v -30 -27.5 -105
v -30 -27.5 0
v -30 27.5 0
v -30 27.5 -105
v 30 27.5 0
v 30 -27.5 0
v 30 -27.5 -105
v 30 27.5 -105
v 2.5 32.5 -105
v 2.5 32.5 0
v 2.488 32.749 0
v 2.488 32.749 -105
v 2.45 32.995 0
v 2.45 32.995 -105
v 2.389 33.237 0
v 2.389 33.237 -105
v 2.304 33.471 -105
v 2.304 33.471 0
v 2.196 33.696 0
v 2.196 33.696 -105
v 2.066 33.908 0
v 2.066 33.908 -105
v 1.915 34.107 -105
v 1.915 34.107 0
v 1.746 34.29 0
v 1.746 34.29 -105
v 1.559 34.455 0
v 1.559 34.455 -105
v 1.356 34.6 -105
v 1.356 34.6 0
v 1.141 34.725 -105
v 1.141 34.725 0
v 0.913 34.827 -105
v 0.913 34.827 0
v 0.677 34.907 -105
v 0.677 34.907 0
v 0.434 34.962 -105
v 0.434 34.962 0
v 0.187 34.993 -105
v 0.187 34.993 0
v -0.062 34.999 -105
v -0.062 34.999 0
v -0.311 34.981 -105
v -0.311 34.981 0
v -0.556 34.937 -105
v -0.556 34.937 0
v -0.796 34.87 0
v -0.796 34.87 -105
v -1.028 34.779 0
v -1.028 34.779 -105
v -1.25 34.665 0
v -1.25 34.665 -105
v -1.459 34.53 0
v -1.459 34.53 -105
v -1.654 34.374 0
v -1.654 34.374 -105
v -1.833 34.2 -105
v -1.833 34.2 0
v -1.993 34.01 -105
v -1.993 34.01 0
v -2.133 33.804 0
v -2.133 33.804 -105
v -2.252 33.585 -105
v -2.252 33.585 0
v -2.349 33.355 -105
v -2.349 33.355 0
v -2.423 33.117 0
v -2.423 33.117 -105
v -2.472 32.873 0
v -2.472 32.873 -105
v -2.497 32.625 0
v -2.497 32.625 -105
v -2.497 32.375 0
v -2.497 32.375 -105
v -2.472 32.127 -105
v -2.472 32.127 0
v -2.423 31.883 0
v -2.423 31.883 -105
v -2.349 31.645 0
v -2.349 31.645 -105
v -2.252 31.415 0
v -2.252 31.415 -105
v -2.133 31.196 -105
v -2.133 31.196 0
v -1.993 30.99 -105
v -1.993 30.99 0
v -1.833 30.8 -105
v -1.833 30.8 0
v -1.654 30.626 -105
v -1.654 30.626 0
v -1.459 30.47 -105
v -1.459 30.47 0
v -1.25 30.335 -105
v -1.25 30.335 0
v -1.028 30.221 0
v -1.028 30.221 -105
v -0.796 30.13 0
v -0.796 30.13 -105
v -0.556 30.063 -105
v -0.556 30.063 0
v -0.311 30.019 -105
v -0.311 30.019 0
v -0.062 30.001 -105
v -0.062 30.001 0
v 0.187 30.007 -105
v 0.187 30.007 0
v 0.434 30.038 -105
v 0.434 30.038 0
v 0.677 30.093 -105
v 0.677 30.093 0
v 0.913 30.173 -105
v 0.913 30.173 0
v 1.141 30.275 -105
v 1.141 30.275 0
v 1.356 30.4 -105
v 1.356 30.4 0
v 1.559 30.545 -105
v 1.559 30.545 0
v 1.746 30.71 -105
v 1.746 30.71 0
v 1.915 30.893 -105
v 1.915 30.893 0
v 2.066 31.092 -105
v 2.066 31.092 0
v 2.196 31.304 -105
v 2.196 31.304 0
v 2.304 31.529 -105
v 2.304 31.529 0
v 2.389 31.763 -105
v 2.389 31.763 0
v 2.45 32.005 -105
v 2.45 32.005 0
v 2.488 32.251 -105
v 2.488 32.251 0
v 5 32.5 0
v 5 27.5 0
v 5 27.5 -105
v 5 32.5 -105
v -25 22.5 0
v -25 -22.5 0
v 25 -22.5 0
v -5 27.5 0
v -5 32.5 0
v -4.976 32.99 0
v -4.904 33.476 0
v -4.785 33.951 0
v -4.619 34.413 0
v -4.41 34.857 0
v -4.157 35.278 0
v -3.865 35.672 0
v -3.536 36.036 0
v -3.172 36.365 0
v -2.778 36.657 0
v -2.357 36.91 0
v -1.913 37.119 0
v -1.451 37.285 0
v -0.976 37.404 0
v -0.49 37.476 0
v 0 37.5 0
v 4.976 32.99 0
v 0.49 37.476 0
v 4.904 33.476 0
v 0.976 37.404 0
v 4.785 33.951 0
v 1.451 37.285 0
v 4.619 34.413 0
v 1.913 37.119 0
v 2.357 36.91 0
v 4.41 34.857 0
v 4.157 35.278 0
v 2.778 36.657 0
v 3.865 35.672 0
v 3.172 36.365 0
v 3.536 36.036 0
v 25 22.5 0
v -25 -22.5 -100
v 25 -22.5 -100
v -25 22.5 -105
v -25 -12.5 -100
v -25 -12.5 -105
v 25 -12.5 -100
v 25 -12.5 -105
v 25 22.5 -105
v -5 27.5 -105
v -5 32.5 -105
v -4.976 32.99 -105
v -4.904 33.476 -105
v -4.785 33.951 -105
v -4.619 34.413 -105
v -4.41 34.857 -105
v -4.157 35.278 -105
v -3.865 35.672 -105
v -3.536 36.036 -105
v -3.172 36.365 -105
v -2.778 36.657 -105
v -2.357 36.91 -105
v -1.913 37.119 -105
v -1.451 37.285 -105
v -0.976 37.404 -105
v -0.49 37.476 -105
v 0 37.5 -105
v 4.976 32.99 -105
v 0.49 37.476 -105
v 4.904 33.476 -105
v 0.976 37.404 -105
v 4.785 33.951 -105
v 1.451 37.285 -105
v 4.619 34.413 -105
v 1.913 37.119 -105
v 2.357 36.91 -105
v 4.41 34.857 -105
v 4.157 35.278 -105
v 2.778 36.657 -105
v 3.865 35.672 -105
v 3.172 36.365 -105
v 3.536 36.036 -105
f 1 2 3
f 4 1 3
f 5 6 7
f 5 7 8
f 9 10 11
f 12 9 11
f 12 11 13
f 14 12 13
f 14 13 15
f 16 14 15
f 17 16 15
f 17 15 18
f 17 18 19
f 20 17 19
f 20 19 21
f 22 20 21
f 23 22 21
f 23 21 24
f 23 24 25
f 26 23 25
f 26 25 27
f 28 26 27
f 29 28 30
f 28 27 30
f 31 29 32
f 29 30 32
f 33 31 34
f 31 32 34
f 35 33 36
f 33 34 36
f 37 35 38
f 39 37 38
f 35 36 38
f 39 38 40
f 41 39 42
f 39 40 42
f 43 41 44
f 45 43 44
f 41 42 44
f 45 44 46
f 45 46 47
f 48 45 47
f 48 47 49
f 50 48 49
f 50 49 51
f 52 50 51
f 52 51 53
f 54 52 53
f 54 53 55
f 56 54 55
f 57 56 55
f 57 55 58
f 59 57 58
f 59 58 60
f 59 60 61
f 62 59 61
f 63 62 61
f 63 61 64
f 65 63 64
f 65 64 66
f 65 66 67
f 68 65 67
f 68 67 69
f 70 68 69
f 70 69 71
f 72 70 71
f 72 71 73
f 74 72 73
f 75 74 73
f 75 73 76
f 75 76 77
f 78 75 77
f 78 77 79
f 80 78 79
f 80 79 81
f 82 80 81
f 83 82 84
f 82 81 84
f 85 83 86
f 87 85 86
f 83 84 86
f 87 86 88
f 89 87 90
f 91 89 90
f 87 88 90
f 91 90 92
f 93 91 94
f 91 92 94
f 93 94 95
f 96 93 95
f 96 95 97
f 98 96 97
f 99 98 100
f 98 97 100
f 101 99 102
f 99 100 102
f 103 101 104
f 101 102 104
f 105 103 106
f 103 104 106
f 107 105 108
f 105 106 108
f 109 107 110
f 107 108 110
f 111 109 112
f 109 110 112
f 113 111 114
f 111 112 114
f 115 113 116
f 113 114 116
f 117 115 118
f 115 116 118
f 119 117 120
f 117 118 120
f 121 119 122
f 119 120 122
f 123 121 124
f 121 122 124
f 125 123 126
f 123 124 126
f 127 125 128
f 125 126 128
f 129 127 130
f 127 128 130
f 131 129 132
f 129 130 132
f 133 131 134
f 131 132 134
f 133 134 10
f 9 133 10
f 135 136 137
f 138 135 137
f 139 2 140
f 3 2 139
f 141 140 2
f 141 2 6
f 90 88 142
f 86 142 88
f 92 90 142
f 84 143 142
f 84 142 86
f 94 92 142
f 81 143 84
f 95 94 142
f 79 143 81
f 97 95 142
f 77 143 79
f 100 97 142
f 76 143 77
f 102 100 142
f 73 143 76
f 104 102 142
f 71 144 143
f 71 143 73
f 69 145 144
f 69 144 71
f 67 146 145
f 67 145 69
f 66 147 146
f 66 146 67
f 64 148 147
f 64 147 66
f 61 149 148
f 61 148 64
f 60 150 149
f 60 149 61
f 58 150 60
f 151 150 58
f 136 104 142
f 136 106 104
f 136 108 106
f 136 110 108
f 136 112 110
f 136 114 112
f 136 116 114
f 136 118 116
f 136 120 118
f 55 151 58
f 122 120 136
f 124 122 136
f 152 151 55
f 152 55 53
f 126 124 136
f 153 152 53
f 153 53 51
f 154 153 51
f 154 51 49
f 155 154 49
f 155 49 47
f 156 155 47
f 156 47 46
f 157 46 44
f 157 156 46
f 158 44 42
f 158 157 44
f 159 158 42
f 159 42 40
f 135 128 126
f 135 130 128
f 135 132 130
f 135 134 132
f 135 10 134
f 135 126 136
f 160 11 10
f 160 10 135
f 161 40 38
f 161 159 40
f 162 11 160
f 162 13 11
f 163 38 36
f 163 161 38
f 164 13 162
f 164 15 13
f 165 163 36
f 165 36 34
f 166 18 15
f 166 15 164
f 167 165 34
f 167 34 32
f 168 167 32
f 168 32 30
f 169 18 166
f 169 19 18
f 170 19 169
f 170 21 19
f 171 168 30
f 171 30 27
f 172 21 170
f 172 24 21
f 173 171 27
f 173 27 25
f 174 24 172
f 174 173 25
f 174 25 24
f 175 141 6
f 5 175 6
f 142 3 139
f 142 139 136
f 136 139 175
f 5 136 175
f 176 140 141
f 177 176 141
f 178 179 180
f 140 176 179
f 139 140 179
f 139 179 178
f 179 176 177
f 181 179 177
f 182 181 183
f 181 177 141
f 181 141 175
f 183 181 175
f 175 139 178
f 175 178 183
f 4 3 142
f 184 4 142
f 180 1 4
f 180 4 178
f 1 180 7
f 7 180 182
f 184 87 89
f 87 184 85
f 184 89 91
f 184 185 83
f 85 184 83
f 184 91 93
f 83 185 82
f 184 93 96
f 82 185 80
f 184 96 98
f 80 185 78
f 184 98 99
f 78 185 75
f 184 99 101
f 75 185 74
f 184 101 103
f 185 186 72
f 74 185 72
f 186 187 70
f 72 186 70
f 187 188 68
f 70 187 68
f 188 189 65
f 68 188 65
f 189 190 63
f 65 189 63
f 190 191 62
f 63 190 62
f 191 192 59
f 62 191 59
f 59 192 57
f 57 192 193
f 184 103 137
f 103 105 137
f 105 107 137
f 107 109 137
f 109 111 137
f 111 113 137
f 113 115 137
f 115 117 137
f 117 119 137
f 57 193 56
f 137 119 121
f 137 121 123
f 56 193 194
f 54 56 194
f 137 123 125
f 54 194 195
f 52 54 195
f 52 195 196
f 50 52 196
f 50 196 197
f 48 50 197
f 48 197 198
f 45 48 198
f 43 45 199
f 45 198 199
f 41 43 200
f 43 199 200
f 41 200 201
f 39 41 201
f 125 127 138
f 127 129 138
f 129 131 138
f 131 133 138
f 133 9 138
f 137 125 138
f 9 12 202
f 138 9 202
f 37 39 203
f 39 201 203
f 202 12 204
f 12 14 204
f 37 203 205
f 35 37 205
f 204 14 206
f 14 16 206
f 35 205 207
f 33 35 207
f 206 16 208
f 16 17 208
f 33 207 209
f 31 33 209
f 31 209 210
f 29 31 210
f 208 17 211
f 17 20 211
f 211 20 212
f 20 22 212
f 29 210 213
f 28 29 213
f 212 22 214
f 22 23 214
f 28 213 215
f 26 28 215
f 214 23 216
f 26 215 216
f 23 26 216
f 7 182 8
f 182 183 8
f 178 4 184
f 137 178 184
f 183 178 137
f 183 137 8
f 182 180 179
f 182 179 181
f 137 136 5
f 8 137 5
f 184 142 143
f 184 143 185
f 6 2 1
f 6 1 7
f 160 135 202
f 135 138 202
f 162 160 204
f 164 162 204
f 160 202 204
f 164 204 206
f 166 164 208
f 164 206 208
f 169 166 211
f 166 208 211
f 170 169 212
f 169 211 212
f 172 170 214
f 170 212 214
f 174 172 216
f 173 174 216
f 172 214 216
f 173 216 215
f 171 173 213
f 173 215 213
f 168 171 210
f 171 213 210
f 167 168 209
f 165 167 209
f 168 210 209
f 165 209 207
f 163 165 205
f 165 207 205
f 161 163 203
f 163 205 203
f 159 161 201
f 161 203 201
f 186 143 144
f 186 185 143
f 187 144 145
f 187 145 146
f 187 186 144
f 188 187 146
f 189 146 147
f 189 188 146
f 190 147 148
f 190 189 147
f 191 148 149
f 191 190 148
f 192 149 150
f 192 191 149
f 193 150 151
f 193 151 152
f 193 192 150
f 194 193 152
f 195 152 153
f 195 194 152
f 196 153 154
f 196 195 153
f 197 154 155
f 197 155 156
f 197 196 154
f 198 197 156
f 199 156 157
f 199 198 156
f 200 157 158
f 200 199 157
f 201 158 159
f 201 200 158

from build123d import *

# Parameters (mm, degrees)
SKETCH3_W           = 60
SKETCH3_H           = 55
SKETCH3_W_2         = 50
SKETCH3_H_2         = 45
BOSS_EXTRUDE1_DEPTH = 105
SKETCH6_W           = 50
SKETCH6_H           = 5
BOSS_EXTRUDE3_DEPTH = 10
SKETCH7_W           = 10
SKETCH7_H           = 105
BOSS_EXTRUDE4_DEPTH = 10
FILLET1_R           = 5
SKETCH8_R           = 2.5
CUT_EXTRUDE1_DEPTH  = 116.461032388


with BuildPart() as part:
    # Sketch3 → Boss-Extrude1 (new body)
    with BuildSketch(Plane.XY):
        Rectangle(SKETCH3_W, SKETCH3_H)
        Rectangle(SKETCH3_W_2, SKETCH3_H_2, mode=Mode.SUBTRACT)
    extrude(amount=-BOSS_EXTRUDE1_DEPTH)

    # Sketch6 → Boss-Extrude3 (add)
    with BuildSketch(Plane(origin=(0, -22.5, 0), x_dir=(1, 0, 0), z_dir=(0, 1, 0))):
        with Locations((0, 102.5)):
            Rectangle(SKETCH6_W, SKETCH6_H)
    extrude(amount=BOSS_EXTRUDE3_DEPTH)

    # Sketch7 → Boss-Extrude4 (add)
    with BuildSketch(Plane(origin=(0, 27.5, 0), x_dir=(1, 0, 0), z_dir=(0, 1, 0))):
        with Locations((0, 52.5)):
            Rectangle(SKETCH7_W, SKETCH7_H)
    extrude(amount=BOSS_EXTRUDE4_DEPTH)

    # Fillet1
    fillet1_edges = [part.edges().sort_by_distance(p)[0] for p in [
        (5, 37.5, -52.5),
        (-5, 37.5, -52.5),
    ]]
    fillet(fillet1_edges, radius=FILLET1_R - 0.0001)  # a hair under: the kernel refuses the full size

    # Sketch8 → Cut-Extrude1 (cut, through all)
    with BuildSketch(Plane.XY):
        with Locations((0, 32.5)):
            Circle(SKETCH8_R)
    extrude(amount=-CUT_EXTRUDE1_DEPTH, mode=Mode.SUBTRACT)


solid = part.part
